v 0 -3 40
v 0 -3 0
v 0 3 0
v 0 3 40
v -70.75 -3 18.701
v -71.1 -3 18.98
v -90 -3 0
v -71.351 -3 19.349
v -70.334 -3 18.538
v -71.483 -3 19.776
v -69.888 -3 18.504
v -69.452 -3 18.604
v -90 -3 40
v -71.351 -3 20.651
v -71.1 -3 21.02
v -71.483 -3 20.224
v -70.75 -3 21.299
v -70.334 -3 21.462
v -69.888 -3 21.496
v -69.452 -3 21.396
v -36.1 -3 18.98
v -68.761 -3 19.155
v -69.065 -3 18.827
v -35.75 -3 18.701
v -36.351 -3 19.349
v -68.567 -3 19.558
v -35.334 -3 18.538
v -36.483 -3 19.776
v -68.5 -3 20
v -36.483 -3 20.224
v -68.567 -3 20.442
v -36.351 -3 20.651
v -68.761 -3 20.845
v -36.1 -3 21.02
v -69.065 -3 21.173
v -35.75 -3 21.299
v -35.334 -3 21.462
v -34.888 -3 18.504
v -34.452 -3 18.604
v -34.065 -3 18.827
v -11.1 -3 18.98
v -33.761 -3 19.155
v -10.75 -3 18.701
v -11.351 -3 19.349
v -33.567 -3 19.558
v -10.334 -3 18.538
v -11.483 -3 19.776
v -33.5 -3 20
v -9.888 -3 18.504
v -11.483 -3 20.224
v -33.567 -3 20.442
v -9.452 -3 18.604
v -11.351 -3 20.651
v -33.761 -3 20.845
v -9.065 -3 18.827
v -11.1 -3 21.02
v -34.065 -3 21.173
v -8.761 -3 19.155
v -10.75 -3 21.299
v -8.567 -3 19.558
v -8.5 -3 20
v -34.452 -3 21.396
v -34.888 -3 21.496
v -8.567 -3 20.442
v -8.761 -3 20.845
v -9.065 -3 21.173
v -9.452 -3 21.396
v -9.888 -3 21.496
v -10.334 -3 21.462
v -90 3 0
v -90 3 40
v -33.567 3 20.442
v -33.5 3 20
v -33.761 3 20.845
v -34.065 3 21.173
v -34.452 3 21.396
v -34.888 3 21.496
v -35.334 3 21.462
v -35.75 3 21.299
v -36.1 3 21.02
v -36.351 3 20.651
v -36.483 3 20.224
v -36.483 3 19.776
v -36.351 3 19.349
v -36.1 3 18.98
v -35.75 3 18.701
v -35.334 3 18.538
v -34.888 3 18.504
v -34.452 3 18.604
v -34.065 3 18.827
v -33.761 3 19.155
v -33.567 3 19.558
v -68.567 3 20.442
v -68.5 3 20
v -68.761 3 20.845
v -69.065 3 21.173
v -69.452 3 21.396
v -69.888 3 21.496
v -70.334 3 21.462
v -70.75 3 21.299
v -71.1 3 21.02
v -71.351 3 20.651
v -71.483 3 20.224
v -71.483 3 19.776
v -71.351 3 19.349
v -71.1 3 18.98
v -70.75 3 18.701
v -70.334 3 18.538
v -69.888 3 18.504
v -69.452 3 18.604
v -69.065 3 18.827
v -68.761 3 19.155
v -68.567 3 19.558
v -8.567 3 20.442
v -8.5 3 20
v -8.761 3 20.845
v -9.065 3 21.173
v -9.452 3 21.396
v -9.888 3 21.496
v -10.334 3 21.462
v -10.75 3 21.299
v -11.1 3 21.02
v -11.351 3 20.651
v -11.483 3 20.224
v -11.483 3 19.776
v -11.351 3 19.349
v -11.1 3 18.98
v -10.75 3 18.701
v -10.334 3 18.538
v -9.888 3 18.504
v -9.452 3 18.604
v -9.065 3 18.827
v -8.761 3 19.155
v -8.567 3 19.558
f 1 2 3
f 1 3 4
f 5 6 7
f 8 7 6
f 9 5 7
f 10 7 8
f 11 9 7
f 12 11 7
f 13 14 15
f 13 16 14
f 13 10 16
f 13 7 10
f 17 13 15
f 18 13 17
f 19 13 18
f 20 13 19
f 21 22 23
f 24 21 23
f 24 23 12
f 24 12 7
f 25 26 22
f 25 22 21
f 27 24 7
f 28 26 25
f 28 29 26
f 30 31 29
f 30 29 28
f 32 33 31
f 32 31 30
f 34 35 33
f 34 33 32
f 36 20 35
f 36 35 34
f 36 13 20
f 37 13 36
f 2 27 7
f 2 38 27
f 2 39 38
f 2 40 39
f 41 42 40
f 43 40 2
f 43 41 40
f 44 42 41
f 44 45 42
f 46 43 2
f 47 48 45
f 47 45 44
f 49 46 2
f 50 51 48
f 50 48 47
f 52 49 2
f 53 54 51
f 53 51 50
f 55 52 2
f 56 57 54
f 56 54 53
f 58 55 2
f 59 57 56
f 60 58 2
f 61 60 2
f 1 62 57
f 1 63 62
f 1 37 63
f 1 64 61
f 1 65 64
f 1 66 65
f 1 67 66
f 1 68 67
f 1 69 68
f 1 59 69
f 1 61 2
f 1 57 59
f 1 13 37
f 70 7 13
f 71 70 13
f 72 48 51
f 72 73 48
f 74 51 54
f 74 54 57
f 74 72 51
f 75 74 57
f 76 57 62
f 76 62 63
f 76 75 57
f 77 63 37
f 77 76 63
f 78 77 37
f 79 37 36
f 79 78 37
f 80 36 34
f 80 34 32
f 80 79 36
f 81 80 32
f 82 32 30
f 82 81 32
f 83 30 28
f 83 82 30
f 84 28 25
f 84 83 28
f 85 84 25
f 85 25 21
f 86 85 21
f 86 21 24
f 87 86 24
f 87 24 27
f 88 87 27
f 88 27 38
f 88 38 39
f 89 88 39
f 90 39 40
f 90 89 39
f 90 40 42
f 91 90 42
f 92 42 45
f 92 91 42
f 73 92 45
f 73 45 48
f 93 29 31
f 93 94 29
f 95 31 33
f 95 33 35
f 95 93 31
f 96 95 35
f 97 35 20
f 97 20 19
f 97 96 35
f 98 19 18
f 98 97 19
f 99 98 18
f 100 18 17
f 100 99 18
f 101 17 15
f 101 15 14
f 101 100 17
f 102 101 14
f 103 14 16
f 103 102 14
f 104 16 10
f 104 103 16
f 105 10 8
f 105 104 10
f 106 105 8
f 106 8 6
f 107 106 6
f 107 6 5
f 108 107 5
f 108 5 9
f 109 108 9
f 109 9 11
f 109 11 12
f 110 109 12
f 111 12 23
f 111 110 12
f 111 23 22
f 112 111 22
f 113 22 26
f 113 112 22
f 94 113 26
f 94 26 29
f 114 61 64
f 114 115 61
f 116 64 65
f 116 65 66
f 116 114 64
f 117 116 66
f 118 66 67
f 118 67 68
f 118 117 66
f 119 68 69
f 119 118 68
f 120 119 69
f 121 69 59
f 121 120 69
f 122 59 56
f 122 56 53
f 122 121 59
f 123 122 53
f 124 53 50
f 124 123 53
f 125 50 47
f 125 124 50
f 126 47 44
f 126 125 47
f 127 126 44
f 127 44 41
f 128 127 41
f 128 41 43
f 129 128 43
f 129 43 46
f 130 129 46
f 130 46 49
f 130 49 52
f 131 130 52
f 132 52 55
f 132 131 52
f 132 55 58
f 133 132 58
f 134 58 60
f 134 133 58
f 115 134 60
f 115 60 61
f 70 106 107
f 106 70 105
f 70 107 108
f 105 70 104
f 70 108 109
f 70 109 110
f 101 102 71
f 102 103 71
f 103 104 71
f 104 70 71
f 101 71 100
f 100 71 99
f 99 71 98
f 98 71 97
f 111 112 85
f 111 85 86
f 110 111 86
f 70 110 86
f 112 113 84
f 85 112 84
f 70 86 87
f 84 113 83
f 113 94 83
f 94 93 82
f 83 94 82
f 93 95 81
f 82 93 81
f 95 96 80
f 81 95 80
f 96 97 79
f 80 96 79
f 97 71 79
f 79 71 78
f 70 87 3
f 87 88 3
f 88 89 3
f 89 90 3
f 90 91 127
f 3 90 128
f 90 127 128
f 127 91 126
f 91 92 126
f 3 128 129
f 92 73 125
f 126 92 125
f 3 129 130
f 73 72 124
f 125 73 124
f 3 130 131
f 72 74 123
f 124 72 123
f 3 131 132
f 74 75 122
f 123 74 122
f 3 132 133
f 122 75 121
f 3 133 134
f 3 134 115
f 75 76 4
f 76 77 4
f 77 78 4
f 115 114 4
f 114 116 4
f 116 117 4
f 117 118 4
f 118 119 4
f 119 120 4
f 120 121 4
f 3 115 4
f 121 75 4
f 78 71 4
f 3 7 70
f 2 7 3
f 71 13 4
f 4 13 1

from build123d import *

# Parameters (mm, degrees)
F0_W     = 90
F0_H     = 40
F0_R     = 1.5
F1_DEPTH = 3


with BuildPart() as f1:
    # F0 (on Front) → F1 (new body, symmetric)
    with BuildSketch(Plane.XZ):
        with Locations((-45, 20)):
            Rectangle(F0_W, F0_H)
        with Locations((-70, 20)):
            Circle(F0_R, mode=Mode.SUBTRACT)
        with Locations((-35, 20)):
            Circle(F0_R, mode=Mode.SUBTRACT)
        with Locations((-10, 20)):
            Circle(F0_R, mode=Mode.SUBTRACT)
    extrude(amount=F1_DEPTH, both=True)


solid = f1.part
